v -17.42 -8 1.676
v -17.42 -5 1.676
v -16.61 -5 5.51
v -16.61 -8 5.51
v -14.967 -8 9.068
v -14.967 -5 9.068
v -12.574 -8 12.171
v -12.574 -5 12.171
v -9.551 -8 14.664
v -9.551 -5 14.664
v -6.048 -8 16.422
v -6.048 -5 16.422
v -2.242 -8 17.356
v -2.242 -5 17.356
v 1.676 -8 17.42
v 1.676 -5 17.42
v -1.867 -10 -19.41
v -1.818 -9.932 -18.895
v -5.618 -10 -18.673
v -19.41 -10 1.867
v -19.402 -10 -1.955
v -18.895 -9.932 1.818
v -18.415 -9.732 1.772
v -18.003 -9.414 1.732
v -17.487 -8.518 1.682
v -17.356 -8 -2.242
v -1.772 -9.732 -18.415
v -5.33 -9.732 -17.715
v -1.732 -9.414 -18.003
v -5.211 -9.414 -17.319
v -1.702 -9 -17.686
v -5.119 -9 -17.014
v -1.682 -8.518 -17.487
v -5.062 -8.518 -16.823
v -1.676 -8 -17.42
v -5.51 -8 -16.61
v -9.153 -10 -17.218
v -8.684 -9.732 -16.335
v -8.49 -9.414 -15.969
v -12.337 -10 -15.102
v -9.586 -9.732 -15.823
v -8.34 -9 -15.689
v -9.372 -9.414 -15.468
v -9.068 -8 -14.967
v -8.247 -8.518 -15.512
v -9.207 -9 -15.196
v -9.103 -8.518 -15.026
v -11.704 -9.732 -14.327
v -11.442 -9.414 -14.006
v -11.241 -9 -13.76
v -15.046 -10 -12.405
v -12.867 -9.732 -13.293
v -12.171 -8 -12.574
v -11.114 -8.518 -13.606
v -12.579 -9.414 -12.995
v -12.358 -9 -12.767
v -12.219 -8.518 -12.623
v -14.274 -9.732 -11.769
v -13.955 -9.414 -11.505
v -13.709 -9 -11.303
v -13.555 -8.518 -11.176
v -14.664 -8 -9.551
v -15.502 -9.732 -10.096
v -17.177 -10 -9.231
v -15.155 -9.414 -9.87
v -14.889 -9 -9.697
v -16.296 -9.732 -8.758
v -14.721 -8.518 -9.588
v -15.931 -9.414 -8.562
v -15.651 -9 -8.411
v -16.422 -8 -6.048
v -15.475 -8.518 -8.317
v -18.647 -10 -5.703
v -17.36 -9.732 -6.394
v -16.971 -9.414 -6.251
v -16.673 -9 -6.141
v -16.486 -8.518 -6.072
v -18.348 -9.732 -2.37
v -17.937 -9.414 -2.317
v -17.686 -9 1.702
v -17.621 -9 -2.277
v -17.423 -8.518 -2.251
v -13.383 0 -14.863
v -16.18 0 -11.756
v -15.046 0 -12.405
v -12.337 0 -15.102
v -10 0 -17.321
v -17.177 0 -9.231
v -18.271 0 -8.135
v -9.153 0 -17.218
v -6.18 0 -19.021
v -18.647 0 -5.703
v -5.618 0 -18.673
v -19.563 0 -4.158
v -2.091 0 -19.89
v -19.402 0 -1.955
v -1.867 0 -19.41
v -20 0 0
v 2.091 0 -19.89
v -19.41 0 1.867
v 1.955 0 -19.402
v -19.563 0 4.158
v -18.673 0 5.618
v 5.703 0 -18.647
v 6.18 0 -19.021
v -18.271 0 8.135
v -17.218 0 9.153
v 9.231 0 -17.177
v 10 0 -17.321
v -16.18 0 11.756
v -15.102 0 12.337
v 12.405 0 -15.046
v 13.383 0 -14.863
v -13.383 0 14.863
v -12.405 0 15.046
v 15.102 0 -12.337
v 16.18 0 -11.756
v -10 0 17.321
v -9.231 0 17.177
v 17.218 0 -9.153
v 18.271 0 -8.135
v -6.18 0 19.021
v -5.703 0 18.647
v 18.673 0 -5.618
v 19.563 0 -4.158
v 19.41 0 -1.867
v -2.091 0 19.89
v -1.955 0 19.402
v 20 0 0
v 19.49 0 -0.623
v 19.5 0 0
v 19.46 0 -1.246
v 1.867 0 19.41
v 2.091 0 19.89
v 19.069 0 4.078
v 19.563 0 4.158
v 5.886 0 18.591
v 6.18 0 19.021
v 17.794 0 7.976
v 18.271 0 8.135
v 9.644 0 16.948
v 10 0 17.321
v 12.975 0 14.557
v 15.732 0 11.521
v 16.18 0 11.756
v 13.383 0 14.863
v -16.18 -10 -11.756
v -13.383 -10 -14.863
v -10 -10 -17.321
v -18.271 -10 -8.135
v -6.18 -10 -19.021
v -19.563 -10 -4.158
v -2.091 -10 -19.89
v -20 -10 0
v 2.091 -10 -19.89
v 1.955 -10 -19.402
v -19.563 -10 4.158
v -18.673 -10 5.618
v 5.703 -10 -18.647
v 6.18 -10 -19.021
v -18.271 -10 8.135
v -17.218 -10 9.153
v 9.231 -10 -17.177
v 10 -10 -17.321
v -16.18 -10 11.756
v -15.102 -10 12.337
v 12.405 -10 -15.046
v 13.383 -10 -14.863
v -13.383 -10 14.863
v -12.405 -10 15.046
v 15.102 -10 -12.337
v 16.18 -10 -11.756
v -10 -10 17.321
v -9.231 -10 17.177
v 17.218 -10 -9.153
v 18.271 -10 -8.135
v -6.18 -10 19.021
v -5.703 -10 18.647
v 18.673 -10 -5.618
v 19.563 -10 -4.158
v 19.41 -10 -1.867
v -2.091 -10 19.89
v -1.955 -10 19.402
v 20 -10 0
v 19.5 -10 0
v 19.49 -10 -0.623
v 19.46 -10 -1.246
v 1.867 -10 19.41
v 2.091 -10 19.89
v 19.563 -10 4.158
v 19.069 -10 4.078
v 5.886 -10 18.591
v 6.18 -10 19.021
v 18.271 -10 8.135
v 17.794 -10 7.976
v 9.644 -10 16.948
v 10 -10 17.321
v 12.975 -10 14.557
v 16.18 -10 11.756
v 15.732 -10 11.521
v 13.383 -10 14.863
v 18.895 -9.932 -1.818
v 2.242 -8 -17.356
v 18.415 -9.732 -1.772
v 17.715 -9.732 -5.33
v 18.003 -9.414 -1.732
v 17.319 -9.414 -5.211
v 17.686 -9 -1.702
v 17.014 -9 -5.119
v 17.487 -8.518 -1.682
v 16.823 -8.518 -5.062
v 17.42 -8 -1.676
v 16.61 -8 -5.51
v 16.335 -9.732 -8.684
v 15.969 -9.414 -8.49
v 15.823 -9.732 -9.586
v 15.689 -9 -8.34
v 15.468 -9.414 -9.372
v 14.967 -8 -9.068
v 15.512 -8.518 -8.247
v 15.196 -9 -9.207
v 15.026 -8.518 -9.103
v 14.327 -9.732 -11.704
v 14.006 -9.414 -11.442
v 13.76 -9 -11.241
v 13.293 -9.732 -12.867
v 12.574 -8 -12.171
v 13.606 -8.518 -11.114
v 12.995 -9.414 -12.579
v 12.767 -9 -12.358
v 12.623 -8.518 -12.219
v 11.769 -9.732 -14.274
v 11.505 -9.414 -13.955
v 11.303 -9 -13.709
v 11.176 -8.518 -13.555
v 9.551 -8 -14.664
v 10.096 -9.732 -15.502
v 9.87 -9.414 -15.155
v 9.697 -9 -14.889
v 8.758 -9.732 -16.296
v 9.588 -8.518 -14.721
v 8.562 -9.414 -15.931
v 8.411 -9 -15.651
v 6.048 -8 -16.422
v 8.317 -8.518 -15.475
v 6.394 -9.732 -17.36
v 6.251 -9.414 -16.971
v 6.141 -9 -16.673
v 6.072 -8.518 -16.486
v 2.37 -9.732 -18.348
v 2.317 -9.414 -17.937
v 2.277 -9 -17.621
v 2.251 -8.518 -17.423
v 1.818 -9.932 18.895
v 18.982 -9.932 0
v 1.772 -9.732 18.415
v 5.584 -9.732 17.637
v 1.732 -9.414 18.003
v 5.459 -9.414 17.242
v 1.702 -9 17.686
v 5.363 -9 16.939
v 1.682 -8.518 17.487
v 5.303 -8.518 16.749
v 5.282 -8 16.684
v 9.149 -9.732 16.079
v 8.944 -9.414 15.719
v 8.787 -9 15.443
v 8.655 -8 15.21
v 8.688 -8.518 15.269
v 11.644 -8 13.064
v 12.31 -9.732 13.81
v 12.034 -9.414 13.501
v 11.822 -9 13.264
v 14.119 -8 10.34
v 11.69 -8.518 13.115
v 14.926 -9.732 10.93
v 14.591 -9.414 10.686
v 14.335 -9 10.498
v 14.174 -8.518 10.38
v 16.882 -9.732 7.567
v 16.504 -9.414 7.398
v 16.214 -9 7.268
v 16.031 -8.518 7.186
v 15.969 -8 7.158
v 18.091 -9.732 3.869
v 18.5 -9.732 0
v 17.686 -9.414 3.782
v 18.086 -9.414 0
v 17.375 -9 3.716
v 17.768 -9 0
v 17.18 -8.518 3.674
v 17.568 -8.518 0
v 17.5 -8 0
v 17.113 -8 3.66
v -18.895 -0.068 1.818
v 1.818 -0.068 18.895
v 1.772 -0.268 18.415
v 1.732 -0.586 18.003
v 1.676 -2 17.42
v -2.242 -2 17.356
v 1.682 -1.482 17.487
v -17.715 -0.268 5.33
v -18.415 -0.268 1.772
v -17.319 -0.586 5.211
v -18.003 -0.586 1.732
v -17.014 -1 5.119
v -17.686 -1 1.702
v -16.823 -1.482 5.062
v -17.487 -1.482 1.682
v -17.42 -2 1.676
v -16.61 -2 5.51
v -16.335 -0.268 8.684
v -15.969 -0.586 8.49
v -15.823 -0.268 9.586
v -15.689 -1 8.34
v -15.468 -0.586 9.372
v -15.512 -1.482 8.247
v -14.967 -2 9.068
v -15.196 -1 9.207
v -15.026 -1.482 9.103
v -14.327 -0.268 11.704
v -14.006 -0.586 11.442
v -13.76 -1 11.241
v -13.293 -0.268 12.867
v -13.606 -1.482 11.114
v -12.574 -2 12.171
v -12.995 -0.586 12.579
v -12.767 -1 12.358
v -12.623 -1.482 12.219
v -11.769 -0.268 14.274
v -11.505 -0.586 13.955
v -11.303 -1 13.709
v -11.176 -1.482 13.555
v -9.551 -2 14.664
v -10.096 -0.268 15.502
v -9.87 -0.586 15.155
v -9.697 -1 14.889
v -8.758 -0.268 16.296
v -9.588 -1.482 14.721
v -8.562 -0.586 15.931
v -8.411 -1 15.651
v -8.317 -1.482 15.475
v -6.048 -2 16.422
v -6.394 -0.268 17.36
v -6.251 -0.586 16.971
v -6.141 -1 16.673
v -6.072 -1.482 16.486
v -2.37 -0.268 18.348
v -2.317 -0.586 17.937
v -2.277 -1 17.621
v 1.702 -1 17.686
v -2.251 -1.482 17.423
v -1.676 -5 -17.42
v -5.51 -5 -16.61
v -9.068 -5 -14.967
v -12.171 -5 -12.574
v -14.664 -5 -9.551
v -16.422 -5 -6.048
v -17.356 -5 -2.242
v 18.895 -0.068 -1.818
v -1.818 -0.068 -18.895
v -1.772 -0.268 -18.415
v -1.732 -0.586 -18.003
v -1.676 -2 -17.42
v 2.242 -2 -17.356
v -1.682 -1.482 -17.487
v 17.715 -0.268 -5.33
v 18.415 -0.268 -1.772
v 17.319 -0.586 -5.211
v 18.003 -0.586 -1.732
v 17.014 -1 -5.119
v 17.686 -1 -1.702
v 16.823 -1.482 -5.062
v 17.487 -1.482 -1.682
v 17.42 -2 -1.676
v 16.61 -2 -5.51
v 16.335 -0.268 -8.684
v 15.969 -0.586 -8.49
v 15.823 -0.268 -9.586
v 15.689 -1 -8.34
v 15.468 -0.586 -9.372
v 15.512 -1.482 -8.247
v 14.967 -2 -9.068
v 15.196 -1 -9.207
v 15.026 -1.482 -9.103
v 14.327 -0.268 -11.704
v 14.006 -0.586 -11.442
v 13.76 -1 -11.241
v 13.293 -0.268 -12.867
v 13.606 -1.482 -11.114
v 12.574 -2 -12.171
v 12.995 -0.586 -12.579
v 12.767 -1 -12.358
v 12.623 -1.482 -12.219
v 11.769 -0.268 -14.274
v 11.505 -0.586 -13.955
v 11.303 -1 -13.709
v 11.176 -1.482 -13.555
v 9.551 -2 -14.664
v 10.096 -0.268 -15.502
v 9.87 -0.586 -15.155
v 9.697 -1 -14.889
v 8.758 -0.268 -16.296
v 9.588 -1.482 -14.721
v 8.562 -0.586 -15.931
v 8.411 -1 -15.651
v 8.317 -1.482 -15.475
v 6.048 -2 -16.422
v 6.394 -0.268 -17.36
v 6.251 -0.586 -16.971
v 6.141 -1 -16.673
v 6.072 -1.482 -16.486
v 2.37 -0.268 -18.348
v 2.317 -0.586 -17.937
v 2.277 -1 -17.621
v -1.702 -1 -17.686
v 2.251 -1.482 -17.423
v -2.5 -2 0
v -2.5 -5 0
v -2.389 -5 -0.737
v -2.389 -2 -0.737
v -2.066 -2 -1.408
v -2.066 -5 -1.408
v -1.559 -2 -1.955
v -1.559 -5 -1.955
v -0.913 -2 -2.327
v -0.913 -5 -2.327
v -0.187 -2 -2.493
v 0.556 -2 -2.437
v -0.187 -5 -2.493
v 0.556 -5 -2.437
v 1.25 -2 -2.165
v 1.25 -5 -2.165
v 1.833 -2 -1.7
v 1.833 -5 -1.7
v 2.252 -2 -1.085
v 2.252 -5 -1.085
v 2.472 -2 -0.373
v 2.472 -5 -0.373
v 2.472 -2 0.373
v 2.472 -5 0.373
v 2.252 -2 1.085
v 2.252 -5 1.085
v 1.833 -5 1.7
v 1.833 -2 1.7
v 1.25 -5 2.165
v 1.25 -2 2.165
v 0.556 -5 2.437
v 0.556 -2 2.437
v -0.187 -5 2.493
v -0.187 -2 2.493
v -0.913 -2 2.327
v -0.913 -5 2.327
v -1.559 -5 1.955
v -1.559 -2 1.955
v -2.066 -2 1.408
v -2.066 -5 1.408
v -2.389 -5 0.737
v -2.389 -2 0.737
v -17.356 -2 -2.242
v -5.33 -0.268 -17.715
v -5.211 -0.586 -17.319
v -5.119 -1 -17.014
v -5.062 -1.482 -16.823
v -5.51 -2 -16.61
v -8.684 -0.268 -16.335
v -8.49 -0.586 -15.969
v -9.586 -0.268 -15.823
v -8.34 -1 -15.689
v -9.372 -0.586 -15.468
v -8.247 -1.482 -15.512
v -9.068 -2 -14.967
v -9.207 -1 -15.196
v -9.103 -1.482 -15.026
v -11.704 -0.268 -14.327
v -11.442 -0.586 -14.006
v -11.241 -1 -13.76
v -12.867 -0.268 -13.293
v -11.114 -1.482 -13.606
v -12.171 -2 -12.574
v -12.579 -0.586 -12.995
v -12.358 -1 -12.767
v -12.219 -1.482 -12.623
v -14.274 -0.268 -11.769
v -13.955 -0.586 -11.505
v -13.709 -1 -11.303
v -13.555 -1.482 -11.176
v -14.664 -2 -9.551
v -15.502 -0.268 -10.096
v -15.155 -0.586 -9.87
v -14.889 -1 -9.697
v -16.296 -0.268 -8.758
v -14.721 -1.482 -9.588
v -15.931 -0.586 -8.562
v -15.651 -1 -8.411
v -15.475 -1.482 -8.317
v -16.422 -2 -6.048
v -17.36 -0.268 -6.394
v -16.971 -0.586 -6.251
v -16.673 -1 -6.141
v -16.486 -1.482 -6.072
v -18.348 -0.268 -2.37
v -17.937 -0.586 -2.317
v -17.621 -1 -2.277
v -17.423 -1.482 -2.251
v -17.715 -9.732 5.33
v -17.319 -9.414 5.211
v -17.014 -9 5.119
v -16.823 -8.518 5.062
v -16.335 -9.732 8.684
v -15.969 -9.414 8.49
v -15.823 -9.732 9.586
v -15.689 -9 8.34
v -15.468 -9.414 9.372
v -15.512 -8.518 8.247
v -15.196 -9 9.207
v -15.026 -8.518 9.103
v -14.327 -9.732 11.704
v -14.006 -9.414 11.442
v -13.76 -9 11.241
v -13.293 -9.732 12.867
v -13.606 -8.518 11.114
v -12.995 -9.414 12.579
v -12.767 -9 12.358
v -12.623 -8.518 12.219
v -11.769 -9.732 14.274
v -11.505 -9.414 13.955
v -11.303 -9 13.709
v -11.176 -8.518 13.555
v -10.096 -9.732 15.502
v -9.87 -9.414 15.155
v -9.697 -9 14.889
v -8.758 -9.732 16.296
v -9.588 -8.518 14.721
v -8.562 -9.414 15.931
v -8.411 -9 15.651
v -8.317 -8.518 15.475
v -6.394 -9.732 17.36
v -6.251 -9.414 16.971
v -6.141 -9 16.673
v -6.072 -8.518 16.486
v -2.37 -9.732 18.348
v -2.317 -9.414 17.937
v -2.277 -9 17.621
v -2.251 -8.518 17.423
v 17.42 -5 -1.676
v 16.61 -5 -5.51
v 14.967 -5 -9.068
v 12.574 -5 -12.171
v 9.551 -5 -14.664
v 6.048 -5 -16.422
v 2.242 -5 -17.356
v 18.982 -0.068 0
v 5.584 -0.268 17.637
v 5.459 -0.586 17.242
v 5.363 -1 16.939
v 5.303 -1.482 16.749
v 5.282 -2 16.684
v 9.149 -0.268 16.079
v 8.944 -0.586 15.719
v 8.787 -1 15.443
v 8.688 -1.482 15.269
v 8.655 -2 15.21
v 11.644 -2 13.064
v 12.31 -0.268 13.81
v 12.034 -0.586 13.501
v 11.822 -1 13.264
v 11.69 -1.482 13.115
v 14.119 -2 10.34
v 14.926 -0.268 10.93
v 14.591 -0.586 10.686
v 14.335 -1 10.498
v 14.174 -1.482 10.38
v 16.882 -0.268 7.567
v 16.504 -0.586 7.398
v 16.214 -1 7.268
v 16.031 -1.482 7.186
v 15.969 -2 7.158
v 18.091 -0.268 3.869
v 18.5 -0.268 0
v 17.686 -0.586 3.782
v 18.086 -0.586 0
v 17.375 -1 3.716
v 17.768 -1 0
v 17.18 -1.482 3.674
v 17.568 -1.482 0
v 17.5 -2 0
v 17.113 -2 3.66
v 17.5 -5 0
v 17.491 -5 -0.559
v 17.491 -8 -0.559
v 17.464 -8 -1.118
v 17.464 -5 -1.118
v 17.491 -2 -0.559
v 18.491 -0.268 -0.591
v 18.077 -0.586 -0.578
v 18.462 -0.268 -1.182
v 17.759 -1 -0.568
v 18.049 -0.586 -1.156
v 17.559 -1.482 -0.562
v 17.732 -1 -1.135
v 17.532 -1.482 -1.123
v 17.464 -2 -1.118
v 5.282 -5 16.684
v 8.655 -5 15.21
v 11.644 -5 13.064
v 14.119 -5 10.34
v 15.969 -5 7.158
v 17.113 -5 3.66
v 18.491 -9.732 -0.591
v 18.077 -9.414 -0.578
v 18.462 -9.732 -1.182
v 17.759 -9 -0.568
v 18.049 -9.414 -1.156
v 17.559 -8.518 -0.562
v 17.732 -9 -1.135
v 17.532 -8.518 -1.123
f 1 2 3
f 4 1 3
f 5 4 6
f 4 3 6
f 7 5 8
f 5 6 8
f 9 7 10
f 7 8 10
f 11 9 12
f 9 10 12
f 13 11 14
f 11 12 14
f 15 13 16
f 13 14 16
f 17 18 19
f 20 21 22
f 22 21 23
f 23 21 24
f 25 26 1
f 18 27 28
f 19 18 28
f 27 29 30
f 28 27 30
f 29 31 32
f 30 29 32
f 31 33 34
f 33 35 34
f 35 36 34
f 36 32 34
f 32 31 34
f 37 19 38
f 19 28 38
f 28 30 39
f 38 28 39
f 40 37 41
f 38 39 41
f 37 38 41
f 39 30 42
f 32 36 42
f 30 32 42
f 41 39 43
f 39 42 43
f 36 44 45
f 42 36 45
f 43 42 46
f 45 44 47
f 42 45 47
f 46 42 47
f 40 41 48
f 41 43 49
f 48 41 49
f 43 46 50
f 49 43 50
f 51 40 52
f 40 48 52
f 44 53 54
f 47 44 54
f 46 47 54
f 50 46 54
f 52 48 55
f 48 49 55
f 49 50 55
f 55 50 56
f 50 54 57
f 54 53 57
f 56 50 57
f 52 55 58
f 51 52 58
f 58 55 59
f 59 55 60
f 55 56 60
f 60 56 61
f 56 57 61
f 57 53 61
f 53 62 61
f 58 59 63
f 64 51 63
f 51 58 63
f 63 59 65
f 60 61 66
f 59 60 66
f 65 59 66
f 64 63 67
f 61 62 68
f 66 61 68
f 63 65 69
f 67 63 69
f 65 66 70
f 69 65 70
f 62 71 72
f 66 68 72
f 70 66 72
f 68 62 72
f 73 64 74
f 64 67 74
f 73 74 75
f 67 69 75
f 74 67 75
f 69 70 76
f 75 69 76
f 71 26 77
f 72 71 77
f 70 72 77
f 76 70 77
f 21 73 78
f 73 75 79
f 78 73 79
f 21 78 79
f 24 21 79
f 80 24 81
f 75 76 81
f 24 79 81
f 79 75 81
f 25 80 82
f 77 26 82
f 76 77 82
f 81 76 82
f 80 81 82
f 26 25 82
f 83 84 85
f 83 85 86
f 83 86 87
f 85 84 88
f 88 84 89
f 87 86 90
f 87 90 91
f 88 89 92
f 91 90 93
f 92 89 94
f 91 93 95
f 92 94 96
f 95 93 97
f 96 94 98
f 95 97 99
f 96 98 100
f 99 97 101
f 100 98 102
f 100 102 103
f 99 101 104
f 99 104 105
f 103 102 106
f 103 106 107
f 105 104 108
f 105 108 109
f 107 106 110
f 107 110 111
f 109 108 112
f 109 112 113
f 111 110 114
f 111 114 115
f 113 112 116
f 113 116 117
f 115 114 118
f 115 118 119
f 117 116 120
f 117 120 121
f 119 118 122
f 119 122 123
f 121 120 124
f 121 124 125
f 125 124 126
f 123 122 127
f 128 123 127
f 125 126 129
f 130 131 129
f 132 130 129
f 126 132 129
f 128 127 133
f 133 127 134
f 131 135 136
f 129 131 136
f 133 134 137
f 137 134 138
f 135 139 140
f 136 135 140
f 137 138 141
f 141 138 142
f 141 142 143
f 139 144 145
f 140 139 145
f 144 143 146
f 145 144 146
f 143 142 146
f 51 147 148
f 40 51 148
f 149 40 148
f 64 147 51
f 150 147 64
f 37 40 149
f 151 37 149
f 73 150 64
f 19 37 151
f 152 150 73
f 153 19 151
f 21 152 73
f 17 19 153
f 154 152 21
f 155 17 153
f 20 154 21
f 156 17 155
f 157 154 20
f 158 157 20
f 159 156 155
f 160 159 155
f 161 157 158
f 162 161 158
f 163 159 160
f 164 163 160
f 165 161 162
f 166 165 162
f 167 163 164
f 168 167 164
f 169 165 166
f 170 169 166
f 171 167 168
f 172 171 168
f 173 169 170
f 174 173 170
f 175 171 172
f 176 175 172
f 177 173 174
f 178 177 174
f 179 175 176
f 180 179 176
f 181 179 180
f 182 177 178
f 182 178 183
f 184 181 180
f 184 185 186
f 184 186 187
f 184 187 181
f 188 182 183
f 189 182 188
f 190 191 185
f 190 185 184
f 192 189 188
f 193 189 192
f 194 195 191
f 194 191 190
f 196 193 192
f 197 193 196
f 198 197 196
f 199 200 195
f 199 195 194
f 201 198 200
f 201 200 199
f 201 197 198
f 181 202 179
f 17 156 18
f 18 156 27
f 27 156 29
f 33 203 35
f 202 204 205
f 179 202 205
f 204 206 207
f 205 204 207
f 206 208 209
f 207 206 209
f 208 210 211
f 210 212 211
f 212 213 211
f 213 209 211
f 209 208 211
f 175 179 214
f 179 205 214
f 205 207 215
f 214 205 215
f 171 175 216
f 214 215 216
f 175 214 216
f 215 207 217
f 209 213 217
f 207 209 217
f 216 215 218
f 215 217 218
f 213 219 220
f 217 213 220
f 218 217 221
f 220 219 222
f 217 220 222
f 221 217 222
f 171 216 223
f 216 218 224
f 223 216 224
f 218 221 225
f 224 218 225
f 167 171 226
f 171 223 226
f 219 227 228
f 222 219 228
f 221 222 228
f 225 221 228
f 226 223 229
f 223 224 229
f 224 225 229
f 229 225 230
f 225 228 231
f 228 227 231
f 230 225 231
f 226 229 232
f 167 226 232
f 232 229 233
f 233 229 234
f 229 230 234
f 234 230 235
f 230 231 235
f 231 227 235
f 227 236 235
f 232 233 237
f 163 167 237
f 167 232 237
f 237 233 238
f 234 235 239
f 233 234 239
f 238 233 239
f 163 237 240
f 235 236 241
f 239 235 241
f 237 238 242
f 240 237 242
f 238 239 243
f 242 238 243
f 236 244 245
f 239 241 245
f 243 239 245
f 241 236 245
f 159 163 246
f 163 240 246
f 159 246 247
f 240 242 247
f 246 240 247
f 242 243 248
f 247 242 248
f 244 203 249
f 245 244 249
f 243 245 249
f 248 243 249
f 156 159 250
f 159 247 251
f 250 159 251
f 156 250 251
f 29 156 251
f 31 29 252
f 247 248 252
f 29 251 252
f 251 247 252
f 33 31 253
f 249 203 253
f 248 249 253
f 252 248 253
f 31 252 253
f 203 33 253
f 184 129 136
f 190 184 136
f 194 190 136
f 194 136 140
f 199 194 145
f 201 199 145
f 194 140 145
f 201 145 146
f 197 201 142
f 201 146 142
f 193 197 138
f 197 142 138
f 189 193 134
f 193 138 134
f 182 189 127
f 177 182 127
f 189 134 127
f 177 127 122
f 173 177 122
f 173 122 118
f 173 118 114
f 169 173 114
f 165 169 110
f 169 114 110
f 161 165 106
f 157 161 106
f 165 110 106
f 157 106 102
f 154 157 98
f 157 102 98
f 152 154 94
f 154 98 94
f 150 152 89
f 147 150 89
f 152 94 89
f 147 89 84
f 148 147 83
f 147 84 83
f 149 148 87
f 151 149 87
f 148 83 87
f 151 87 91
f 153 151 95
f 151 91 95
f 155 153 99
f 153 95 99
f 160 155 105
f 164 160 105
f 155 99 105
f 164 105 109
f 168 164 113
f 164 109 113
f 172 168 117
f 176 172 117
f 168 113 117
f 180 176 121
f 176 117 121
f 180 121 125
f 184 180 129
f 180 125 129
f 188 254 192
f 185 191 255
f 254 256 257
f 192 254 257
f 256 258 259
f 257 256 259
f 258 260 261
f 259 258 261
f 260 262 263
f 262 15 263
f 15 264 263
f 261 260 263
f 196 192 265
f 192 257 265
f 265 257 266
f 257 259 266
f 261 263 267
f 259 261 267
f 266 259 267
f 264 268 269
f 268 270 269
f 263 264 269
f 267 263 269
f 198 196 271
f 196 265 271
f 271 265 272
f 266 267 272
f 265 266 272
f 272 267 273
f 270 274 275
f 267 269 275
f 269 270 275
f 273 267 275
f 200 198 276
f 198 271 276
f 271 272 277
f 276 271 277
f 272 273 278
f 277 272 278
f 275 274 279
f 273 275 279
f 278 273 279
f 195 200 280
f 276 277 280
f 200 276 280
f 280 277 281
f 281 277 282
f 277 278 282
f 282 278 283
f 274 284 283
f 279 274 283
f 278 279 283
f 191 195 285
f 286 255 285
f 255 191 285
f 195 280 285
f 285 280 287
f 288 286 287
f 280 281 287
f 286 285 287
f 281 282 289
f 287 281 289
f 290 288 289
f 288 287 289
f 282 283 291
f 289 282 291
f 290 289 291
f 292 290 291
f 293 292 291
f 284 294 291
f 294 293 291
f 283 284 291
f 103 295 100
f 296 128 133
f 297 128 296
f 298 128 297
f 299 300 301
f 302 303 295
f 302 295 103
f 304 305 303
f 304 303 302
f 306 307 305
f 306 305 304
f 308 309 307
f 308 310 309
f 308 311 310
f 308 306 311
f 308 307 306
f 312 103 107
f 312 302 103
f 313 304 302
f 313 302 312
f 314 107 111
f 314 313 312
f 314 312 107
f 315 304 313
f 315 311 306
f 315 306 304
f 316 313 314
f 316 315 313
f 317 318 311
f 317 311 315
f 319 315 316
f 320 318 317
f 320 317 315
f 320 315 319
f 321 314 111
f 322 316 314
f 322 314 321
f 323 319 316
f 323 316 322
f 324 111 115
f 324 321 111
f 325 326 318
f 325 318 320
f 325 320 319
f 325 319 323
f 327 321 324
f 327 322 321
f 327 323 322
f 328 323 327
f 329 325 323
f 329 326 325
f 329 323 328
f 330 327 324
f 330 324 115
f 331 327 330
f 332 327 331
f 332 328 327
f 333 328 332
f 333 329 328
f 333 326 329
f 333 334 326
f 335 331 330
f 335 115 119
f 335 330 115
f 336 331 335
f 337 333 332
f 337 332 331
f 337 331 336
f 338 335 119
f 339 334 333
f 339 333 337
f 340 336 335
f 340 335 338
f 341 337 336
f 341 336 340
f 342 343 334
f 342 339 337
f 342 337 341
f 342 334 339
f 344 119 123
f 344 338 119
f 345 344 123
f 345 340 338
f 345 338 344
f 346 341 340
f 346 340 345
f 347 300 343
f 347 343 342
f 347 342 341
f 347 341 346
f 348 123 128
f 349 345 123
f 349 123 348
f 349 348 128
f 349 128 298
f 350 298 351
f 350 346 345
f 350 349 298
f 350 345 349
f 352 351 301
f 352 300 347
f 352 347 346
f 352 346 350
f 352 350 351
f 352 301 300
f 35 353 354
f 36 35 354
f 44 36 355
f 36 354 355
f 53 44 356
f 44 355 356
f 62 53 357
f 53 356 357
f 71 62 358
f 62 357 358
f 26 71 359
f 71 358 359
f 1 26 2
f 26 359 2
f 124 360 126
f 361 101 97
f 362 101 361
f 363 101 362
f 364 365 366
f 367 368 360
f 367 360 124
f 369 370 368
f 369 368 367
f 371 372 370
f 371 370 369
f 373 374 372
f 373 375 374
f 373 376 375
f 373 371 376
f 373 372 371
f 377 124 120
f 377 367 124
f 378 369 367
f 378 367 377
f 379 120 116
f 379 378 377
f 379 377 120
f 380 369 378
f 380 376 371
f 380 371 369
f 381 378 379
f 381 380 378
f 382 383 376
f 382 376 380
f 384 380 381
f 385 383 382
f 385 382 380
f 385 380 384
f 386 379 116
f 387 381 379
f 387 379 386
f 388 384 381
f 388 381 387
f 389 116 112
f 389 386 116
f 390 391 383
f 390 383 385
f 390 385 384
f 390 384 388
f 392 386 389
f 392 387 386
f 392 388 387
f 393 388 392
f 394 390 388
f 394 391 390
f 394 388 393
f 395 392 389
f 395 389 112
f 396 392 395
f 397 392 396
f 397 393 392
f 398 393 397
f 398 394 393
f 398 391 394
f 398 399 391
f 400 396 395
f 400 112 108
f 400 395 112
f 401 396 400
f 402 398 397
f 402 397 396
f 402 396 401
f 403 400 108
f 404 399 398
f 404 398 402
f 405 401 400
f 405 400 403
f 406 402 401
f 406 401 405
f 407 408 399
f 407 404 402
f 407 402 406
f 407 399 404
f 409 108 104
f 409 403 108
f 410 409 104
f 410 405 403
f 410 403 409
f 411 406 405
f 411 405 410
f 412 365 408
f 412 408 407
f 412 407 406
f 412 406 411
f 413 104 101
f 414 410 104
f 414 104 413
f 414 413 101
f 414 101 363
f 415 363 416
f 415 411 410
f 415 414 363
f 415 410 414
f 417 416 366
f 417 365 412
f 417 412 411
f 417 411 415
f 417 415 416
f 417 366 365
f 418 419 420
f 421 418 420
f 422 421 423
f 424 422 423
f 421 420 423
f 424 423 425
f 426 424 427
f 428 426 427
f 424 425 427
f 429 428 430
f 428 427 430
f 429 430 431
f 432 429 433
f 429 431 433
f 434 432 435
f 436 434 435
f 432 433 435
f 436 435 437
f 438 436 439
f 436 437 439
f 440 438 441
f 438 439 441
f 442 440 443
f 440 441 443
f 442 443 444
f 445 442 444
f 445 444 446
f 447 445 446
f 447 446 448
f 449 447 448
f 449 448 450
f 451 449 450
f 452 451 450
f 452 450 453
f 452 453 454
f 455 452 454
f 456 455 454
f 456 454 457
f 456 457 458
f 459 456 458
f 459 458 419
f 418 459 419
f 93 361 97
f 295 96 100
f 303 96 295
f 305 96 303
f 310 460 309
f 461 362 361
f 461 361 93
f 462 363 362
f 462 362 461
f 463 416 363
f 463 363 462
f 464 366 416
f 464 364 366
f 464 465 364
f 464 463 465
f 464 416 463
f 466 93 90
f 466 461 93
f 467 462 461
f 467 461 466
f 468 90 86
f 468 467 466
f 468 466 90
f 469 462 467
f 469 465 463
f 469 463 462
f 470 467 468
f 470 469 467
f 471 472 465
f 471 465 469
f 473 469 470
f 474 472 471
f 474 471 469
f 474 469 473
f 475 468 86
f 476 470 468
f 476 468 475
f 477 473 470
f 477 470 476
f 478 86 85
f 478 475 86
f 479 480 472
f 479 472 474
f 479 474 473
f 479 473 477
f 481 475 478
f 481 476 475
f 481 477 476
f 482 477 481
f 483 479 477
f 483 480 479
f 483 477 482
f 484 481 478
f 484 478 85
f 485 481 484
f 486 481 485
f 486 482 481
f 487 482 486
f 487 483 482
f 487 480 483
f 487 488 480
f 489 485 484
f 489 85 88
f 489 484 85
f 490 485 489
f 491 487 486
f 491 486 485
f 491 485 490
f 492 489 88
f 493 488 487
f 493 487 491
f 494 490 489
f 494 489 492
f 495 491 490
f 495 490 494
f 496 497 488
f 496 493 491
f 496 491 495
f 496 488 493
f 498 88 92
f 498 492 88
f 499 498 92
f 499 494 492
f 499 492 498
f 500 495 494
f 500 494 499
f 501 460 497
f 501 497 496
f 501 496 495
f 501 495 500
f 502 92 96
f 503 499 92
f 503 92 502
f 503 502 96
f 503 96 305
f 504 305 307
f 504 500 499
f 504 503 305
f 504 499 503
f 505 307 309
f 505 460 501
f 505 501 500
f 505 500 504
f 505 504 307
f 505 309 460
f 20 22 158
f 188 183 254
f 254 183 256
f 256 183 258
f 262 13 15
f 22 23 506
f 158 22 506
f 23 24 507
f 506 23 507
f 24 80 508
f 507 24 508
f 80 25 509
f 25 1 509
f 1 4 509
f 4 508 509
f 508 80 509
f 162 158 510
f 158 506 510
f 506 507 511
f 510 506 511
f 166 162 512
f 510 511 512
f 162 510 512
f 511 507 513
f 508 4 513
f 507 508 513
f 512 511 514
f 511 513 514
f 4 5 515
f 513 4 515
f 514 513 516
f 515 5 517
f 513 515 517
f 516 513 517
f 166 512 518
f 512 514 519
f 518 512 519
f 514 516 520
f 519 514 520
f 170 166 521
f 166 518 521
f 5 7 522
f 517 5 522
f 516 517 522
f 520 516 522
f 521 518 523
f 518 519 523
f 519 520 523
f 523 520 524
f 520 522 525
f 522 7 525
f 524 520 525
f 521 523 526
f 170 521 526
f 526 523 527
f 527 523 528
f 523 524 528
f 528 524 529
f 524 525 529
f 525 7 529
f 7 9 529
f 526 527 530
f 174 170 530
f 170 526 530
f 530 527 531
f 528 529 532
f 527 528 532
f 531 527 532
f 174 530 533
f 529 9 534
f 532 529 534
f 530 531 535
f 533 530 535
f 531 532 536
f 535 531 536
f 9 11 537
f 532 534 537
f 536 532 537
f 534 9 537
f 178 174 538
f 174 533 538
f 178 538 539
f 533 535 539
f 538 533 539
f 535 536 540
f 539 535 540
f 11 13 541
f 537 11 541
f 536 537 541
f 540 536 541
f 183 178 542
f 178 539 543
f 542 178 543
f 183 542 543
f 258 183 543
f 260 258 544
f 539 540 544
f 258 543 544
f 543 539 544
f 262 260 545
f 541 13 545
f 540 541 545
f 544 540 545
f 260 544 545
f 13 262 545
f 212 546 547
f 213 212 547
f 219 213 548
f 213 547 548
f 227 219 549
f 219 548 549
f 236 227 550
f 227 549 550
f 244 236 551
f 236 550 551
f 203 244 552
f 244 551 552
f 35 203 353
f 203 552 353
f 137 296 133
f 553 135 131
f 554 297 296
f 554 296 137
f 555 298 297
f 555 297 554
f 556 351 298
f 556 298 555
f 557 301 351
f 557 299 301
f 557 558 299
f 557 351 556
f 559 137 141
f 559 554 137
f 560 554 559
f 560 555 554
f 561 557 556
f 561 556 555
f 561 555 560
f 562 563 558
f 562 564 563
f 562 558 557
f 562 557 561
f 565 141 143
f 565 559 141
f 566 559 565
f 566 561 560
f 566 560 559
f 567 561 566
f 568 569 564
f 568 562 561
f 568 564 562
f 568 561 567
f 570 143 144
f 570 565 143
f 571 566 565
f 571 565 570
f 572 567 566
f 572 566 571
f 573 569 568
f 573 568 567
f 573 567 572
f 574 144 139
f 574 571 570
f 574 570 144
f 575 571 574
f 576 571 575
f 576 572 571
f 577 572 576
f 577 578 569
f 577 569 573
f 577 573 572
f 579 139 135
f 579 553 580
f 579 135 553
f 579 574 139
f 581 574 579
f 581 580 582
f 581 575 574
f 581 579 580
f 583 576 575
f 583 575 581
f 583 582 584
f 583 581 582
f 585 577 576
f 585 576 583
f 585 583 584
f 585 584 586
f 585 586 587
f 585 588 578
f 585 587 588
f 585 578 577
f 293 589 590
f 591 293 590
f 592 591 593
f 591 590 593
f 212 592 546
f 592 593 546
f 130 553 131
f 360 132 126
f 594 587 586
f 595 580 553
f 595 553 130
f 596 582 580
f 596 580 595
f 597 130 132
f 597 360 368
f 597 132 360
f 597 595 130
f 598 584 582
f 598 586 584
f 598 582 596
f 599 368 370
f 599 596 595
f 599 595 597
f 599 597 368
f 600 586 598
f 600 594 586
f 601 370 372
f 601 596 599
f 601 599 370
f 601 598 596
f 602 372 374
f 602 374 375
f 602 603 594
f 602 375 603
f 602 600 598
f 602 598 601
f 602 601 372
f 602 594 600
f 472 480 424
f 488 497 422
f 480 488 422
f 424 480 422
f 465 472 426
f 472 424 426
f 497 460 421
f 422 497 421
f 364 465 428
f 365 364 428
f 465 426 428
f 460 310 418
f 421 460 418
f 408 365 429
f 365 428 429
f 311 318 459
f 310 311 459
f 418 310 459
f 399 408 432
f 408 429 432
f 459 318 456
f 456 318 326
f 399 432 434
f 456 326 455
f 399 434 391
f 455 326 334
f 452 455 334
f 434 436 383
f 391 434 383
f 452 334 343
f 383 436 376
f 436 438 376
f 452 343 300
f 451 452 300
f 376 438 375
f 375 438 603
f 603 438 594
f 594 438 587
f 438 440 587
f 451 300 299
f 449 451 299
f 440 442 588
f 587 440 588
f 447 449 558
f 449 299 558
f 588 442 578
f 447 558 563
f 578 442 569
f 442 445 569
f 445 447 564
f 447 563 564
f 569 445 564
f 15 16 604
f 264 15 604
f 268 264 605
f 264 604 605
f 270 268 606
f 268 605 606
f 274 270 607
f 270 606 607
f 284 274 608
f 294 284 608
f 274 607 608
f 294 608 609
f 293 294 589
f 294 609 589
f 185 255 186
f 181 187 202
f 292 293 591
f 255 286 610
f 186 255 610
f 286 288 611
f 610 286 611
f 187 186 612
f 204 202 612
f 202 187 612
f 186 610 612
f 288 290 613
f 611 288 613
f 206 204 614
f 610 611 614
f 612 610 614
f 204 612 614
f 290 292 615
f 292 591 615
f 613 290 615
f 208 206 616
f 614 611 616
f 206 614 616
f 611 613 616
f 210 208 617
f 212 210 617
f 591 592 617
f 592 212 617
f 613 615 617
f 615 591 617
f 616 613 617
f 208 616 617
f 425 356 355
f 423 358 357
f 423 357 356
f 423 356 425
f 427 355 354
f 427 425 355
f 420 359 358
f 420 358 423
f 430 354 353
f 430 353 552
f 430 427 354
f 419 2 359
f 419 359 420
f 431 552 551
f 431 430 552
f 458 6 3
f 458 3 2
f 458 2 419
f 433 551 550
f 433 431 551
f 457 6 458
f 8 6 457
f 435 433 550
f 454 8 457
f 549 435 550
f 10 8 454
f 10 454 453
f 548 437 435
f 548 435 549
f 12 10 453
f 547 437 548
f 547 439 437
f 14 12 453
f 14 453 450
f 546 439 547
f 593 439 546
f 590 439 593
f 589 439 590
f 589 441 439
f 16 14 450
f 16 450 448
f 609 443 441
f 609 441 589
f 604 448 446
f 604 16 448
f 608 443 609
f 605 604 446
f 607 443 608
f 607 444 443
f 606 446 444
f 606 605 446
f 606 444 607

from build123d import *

# Parameters (mm, degrees)
F0_R     = 20
F1_DEPTH = 10
F2_START = 2
F2_DEPTH = 3
F3_R     = 1.99999
F4_D     = 5


# Not quite as in the source:
# - a fillet or chamfer is up to 0.001 mm smaller than in the source, because OpenCascade refuses the exact size


with BuildPart() as f1:
    # F0 (on Front) → F1 (new body)
    with BuildSketch(Plane.XZ):
        Circle(F0_R)
        with BuildLine():
            ThreePointArc((1.6759297538, 17.4195654211), (12.9533542122, 11.766928854), (17.5, 0))
            ThreePointArc((17.5, 0), (17.4798797889, -0.8389294162), (17.4195654211, -1.6759297538))
            ThreePointArc((17.4195654211, -1.6759297538), (11.1324315409, -13.5025541283), (-1.6759297538, -17.4195654211))
            ThreePointArc((-1.6759297538, -17.4195654211), (-13.5025541283, -11.1324315409), (-17.4195654211, 1.6759297538))
            ThreePointArc((-17.4195654211, 1.6759297538), (-11.1324315409, 13.5025541283), (1.6759297538, 17.4195654211))
        make_face(mode=Mode.SUBTRACT)
    extrude(amount=F1_DEPTH)

    # F0 (on Front) → F2 (join)
    with BuildSketch(Plane.XZ.offset(F2_START)):
        with BuildLine():
            Line((0, 0), (1.6759297538, 17.4195654211))
            ThreePointArc((1.6759297538, 17.4195654211), (-11.1324315409, 13.5025541283), (-17.4195654211, 1.6759297538))
            Line((-17.4195654211, 1.6759297538), (0, 0))
        make_face()
        with BuildLine():
            ThreePointArc((-1.6759297538, -17.4195654211), (11.1324315409, -13.5025541283), (17.4195654211, -1.6759297538))
            Line((17.4195654211, -1.6759297538), (0, 0))
            Line((0, 0), (-1.6759297538, -17.4195654211))
        make_face()
        with BuildLine():
            Line((0, 0), (-17.4195654211, 1.6759297538))
            ThreePointArc((-17.4195654211, 1.6759297538), (-13.5025541283, -11.1324315409), (-1.6759297538, -17.4195654211))
            Line((-1.6759297538, -17.4195654211), (0, 0))
        make_face()
        with BuildLine():
            ThreePointArc((17.4195654211, -1.6759297538), (17.4798797889, -0.8389294162), (17.5, 0))
            ThreePointArc((17.5, 0), (12.9533542122, 11.766928854), (1.6759297538, 17.4195654211))
            Line((1.6759297538, 17.4195654211), (0, 0))
            Line((0, 0), (17.4195654211, -1.6759297538))
        make_face()
    extrude(amount=F2_DEPTH)

    # F3 (radius 2 in the source; OpenCascade refuses exactly that, so slightly less here)
    f3_edges = [f1.edges().sort_by_distance(p)[0] for p in [
        (-17.5, -10, 0),
        (-17.5, 0, 0),
    ]]
    fillet(f3_edges, radius=F3_R)

    # F4 (through all)
    with Locations(Plane(origin=(0, 0, 0), x_dir=(1, 0, 0), z_dir=(0, 1, 0))):
        with Locations((0, 0)):
            Hole(F4_D / 2)


solid = f1.part
